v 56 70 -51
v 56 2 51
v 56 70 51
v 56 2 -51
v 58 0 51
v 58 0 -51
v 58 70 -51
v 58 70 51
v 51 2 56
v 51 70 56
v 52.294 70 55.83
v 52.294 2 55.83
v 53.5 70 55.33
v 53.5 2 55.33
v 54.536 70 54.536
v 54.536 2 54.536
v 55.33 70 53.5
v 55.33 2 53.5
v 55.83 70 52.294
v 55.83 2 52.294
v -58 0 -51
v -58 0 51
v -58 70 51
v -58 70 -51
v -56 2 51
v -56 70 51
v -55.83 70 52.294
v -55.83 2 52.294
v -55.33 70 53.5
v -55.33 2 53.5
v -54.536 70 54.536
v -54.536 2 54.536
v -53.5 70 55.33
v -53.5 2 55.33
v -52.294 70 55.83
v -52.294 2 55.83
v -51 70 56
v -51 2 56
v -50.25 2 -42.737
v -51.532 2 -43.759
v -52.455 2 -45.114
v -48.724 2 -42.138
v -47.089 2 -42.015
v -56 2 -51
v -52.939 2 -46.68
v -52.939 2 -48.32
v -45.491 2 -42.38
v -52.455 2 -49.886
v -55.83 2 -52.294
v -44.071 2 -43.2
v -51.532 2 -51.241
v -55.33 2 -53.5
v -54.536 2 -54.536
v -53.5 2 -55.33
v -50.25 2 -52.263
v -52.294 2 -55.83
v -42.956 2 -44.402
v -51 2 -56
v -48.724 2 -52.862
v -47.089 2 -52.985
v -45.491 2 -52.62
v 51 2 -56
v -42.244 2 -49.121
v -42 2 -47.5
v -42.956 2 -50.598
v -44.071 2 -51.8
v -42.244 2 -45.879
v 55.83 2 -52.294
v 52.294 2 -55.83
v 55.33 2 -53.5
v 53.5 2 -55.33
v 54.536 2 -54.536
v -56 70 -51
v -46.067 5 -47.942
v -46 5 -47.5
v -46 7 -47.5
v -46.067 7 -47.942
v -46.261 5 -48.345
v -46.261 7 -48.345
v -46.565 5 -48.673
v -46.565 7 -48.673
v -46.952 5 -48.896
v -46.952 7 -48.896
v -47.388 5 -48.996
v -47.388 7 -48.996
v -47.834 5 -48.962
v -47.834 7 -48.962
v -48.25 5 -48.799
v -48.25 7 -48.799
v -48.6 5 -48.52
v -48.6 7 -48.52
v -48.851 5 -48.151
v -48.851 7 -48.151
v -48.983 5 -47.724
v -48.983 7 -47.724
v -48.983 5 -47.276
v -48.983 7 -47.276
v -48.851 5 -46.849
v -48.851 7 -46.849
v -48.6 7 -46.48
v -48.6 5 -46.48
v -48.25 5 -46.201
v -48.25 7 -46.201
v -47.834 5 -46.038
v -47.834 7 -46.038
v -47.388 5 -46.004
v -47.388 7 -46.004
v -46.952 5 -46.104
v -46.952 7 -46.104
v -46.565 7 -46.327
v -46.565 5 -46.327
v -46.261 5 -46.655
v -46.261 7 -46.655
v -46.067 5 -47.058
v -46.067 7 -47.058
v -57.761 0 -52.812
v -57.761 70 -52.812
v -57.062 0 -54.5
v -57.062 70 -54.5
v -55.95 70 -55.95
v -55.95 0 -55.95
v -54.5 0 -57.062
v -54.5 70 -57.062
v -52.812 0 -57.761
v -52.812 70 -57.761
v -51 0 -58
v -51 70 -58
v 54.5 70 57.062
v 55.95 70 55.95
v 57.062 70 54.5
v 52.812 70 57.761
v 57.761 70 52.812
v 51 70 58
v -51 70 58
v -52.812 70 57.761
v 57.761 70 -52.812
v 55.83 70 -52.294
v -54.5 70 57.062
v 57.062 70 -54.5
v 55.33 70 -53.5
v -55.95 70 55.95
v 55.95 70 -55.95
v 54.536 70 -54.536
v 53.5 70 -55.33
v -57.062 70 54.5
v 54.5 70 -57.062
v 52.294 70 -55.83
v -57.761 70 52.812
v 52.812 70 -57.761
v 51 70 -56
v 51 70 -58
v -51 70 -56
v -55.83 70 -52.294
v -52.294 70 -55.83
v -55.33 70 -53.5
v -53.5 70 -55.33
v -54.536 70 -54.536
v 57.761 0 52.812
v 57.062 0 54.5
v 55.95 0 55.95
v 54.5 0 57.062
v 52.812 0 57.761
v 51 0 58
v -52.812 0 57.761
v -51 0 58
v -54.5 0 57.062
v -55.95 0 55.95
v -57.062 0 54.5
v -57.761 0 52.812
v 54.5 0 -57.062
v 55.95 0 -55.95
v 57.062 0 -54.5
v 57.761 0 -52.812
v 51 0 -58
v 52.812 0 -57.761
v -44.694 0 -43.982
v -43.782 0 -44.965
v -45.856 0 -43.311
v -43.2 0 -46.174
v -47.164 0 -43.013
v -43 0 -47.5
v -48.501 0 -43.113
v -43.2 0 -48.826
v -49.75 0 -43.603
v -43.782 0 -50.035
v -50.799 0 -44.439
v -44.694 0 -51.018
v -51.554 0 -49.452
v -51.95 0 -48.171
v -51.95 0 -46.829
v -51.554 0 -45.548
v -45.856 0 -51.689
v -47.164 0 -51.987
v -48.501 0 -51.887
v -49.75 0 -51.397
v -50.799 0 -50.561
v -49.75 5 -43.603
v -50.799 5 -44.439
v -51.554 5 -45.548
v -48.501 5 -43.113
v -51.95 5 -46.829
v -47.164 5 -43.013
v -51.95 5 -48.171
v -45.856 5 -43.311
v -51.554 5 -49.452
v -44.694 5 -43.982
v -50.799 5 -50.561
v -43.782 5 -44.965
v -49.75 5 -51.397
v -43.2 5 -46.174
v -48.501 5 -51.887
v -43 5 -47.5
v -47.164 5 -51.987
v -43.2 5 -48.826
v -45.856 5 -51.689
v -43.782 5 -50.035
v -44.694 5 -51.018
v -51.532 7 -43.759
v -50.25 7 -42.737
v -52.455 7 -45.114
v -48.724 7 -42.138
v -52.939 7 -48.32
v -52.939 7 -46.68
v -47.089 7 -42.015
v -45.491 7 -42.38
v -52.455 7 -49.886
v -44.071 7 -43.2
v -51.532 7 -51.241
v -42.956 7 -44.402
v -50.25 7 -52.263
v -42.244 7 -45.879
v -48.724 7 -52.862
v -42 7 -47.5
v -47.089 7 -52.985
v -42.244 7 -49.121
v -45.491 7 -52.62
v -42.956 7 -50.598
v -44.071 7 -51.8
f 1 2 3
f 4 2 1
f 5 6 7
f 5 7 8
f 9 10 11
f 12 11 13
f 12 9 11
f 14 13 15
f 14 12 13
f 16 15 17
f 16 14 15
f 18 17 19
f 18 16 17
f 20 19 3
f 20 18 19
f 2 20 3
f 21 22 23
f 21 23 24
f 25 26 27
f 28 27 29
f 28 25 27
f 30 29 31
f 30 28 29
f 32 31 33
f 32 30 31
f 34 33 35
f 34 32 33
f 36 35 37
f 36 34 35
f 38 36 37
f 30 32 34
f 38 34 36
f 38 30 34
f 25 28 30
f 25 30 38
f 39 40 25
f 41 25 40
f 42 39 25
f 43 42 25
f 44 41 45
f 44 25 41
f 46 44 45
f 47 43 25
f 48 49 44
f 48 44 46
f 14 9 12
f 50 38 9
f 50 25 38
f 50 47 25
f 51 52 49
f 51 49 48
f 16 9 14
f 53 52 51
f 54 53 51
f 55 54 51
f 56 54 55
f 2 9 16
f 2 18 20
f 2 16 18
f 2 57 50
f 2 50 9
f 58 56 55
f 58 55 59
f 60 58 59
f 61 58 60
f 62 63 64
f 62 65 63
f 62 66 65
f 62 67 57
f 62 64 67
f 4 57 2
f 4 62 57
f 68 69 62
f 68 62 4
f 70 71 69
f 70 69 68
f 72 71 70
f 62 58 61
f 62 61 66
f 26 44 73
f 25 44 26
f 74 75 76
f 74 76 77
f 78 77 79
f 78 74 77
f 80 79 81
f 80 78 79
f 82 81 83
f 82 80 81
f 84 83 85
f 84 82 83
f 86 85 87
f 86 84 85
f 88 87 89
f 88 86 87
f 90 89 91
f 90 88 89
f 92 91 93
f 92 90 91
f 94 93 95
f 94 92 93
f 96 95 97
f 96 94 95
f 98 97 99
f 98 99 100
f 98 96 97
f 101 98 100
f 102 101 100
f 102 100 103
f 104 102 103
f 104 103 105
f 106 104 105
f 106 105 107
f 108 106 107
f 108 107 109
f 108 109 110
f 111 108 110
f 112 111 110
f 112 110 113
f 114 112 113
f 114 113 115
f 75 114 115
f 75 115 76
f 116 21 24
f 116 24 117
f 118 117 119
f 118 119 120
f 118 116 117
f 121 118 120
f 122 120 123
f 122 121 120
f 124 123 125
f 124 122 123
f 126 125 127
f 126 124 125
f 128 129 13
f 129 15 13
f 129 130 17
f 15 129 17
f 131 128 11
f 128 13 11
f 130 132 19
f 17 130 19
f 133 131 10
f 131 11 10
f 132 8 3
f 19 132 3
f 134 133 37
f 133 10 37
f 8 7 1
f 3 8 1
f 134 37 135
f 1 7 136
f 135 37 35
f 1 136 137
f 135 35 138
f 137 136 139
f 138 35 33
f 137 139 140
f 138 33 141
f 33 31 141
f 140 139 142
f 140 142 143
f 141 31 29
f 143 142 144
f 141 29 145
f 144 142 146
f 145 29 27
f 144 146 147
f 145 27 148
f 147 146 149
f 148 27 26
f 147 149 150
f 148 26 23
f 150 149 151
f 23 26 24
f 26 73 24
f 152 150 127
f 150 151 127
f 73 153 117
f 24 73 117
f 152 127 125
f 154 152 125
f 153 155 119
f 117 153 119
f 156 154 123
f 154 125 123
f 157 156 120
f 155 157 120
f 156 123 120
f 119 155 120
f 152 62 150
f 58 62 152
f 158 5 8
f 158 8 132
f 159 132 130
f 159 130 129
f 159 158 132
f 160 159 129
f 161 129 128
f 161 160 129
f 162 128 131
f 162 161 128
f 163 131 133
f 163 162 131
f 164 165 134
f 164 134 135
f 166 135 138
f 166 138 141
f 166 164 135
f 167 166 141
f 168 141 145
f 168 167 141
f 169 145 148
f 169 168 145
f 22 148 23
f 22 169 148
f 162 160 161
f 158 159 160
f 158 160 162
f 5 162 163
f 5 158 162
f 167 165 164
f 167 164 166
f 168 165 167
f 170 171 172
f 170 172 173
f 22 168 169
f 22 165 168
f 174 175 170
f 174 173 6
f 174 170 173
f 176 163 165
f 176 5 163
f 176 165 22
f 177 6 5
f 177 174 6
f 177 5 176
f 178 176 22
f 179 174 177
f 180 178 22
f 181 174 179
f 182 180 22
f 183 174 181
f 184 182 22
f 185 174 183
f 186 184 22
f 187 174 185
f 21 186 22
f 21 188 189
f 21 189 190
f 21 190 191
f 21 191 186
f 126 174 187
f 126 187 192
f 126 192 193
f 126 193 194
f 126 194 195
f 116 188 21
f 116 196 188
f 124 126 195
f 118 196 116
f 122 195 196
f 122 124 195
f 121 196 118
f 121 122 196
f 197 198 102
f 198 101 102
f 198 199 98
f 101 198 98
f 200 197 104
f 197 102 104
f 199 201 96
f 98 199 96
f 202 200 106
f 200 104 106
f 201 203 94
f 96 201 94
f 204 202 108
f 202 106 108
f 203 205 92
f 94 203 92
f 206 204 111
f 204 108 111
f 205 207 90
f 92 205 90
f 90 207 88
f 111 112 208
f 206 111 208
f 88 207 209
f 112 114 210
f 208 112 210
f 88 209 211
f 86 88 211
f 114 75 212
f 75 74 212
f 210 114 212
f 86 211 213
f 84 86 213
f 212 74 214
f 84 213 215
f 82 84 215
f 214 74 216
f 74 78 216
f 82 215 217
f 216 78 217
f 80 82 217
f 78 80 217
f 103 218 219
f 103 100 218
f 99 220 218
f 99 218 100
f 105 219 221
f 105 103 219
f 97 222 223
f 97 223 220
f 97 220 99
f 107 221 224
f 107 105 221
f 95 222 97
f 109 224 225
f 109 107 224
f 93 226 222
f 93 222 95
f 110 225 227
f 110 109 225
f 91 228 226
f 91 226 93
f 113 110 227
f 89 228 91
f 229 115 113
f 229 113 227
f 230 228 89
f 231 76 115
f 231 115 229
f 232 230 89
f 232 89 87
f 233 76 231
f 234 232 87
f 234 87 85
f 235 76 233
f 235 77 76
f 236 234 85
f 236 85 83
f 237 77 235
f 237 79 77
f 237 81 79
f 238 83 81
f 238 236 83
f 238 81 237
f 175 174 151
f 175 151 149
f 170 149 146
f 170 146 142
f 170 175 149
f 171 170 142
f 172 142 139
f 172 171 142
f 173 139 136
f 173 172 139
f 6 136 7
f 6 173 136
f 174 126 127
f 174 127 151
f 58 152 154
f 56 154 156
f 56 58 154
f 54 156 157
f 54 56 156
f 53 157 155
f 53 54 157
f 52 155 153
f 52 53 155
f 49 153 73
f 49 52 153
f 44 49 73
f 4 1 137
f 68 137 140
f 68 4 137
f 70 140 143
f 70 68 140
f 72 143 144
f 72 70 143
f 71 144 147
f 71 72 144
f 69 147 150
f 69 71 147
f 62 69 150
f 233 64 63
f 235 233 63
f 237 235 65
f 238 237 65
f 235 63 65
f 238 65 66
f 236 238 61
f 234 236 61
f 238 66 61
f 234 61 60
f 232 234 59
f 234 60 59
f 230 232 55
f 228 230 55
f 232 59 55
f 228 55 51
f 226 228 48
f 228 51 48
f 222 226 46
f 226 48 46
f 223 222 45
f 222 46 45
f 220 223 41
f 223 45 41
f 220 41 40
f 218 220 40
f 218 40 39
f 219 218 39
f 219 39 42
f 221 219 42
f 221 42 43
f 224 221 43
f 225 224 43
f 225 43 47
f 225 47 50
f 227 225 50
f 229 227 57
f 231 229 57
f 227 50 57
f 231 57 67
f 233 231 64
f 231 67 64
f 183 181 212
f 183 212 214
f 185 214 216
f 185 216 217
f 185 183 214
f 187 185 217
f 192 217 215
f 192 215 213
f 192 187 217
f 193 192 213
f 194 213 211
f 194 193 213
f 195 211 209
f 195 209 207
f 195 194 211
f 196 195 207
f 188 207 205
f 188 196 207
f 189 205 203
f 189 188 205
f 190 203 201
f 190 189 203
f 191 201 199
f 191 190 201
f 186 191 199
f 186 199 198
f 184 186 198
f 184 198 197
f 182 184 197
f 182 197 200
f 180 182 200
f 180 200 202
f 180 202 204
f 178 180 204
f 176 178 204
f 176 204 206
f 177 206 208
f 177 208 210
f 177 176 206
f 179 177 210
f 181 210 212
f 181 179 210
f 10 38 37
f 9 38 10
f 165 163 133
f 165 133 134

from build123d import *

# Parameters (mm, degrees)
BOSS_EXTRUDE1_DEPTH = 70
BOSS_EXTRUDE2_DEPTH = 2
SKETCH5_R           = 5.5
SKETCH5_R_2         = 1.5
BOSS_EXTRUDE3_DEPTH = 5
SKETCH8_R           = 4.5
CUT_EXTRUDE3_DEPTH  = 5


with BuildPart() as part:
    # Sketch1 → Boss-Extrude1 (new body)
    with BuildSketch(Plane(origin=(0, 0, 0), x_dir=(1, 0, 0), z_dir=(0, 1, 0))):
        with BuildLine():
            Line((-51, 58), (51, 58))
            ThreePointArc((51, 58), (55.949747468, 55.949747468), (58, 51))
            Line((58, 51), (58, -51))
            ThreePointArc((58, -51), (55.949747468, -55.949747468), (51, -58))
            Line((51, -58), (-51, -58))
            ThreePointArc((-51, -58), (-55.949747468, -55.949747468), (-58, -51))
            Line((-58, -51), (-58, 51))
            ThreePointArc((-58, 51), (-55.949747468, 55.949747468), (-51, 58))
        make_face()
        with BuildLine():
            Line((-51, -56), (51, -56))
            ThreePointArc((51, -56), (54.535533906, -54.535533906), (56, -51))
            Line((56, -51), (56, 51))
            ThreePointArc((56, 51), (54.535533906, 54.535533906), (51, 56))
            Line((51, 56), (-51, 56))
            ThreePointArc((-51, 56), (-54.535533906, 54.535533906), (-56, 51))
            Line((-56, 51), (-56, -51))
            ThreePointArc((-56, -51), (-54.535533906, -54.535533906), (-51, -56))
        make_face(mode=Mode.SUBTRACT)
    extrude(amount=BOSS_EXTRUDE1_DEPTH)

    # Sketch3 → Boss-Extrude2 (add)
    with BuildSketch(Plane(origin=(0, 0, 0), x_dir=(1, 0, 0), z_dir=(0, 1, 0))):
        with BuildLine():
            Line((51, 58), (-51, 58))
            ThreePointArc((-51, 58), (-55.949747468, 55.949747468), (-58, 51))
            Line((-58, 51), (-58, -51))
            ThreePointArc((-58, -51), (-55.949747468, -55.949747468), (-51, -58))
            Line((-51, -58), (51, -58))
            ThreePointArc((51, -58), (55.949747468, -55.949747468), (58, -51))
            Line((58, -51), (58, 51))
            ThreePointArc((58, 51), (55.949747468, 55.949747468), (51, 58))
        make_face()
    extrude(amount=BOSS_EXTRUDE2_DEPTH)

    # Sketch5 → Boss-Extrude3 (add)
    with BuildSketch(Plane(origin=(0, 2, 0), x_dir=(1, 0, 0), z_dir=(0, 1, 0))):
        with Locations((-47.5, 47.5)):
            Circle(SKETCH5_R)
        with Locations((-47.5, 47.5)):
            Circle(SKETCH5_R_2, mode=Mode.SUBTRACT)
    extrude(amount=BOSS_EXTRUDE3_DEPTH)

    # Sketch8 → Cut-Extrude3 (cut)
    with BuildSketch(Plane(origin=(0, 0, 0), x_dir=(1, 0, 0), z_dir=(0, 1, 0))):
        with Locations((-47.5, 47.5)):
            Circle(SKETCH8_R)
    extrude(amount=CUT_EXTRUDE3_DEPTH, mode=Mode.SUBTRACT)


solid = part.part
